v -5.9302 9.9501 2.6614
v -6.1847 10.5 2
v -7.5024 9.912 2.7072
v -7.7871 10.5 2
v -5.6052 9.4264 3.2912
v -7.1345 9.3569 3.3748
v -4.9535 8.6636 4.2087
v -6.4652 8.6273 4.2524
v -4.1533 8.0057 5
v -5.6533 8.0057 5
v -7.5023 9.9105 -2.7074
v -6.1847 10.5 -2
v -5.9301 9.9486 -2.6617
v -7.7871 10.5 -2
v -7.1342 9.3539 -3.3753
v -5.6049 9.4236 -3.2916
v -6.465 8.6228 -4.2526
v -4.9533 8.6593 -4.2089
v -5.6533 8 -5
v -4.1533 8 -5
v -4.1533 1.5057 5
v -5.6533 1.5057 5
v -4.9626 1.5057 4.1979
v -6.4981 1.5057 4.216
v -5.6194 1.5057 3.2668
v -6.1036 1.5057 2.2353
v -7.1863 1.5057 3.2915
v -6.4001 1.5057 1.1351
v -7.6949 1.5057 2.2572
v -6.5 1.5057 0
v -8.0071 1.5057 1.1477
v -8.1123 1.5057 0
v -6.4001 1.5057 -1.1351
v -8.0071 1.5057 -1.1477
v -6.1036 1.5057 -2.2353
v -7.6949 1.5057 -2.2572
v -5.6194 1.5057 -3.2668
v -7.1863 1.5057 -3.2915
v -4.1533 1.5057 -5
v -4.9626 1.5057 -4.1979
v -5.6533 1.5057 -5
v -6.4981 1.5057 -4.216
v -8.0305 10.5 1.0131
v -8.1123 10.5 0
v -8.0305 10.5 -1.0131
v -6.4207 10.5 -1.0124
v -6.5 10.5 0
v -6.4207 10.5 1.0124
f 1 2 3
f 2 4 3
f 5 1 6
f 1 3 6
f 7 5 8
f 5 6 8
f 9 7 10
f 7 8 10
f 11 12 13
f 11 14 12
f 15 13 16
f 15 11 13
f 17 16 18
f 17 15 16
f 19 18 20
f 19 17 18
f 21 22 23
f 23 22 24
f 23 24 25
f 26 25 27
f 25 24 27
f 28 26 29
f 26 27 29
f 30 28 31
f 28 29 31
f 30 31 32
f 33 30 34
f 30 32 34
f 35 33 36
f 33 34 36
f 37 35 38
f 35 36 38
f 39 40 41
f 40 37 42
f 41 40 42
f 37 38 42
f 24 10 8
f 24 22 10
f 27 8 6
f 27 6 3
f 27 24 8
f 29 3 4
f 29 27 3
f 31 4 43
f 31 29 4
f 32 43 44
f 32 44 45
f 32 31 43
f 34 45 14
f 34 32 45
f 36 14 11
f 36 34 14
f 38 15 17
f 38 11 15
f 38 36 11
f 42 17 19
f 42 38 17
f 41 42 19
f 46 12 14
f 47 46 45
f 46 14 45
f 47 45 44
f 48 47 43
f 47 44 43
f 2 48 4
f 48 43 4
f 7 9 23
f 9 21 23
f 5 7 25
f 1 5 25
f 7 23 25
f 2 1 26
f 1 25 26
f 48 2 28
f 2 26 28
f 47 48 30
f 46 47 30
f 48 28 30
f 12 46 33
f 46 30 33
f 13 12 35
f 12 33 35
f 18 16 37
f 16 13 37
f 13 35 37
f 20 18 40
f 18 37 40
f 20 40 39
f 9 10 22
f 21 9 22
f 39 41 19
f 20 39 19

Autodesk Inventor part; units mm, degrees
ref_plane "YZ Plane" through (0, 0, 0) normal (1, 0, 0) x (0, 1, 0)
ref_plane "XZ Plane" through (0, 0, 0) normal (0, 1, 0) x (-1, 0, 0)
ref_plane "XY Plane" through (0, 0, 0) normal (0, 0, 1) x (1, 0, 0)
sketch "Sketch1" plane through (0, 0, 0) normal (0, 1, 0) x (-1, 0, 0)
  arc A0 (0, -6.5) -> (0, 6.5) centre (0, 0) ccw
  line L0 (0, 6.5) -> (0, -6.5)
  dimension "d0" = 13
extrude "Extrusion1" add sketch "Sketch1" along normal blind 12
ref_plane "Work Plane1" through (-10, 0, 6.5) normal (1, 0, 0) x (0, 0, -1)
sketch "Sketch2" plane through (-10, 0, 6.5) normal (1, 0, 0) x (0, 0, -1)
  line L0 (1.5, 8.0057) -> (1.5, 1.5057)
  line L1 (1.5, 1.5057) -> (11.5, 1.5057)
  line L2 (11.5, 1.5057) -> (11.5, 8)
  line L3 (8.5, 10.5) -> (4.5, 10.5)
  line L4 (8.5, 10.5) -> (11.5, 8)
  line L5 (4.5, 10.5) -> (1.5, 8.0057)
  line L6 (13, 0) -> (13, 12) projected
  point P0 (6.5, 0)
  dimension "d9" = 10
  dimension "d10" = 6.5
  dimension "d12" = 4
  dimension "d14" = 3
  dimension "d15" = 3
  dimension "d24" = 1.5
extrude "Extrusion2" add sketch "Sketch2" along normal blind 10
sketch "Sketch7" plane through (0, 0, 0) normal (0, 1, 0) x (-1, 0, 0)
  arc A0 (0, -6.5) -> (0, 6.5) centre (0, 0) ccw
  line L0 (0, 6.5) -> (0, -6.5)
  line L1 (0, -6.5) -> (0, 6.5)
extrude "Extrusion7" cut sketch "Sketch7" along normal through all
sketch "Sketch8" plane through (0, 0, 0) normal (0, 1, 0) x (-1, 0, 0)
  arc A0 (5.6533, -5) -> (5.6533, 5) centre (1.7994, 0) ccw
  line L0 (5.6533, -5) -> (4.1533, -5)
  line L1 (5.6533, 5) -> (4.1533, 5)
  line L2 (10, 5) -> (4.1533, 5) projected
  arc A1 (4.1533, -5) -> (4.1533, 5) centre (10.21, 0) ccw
  point P0 (0, 0)
  dimension "d36" = 1.5
  dimension "d37" = 1.5
extrude "Extrusion8" cut sketch "Sketch8" along normal through all both and the other way through all
properties part number "13mm_radius_mold_with_crystal_skull"
